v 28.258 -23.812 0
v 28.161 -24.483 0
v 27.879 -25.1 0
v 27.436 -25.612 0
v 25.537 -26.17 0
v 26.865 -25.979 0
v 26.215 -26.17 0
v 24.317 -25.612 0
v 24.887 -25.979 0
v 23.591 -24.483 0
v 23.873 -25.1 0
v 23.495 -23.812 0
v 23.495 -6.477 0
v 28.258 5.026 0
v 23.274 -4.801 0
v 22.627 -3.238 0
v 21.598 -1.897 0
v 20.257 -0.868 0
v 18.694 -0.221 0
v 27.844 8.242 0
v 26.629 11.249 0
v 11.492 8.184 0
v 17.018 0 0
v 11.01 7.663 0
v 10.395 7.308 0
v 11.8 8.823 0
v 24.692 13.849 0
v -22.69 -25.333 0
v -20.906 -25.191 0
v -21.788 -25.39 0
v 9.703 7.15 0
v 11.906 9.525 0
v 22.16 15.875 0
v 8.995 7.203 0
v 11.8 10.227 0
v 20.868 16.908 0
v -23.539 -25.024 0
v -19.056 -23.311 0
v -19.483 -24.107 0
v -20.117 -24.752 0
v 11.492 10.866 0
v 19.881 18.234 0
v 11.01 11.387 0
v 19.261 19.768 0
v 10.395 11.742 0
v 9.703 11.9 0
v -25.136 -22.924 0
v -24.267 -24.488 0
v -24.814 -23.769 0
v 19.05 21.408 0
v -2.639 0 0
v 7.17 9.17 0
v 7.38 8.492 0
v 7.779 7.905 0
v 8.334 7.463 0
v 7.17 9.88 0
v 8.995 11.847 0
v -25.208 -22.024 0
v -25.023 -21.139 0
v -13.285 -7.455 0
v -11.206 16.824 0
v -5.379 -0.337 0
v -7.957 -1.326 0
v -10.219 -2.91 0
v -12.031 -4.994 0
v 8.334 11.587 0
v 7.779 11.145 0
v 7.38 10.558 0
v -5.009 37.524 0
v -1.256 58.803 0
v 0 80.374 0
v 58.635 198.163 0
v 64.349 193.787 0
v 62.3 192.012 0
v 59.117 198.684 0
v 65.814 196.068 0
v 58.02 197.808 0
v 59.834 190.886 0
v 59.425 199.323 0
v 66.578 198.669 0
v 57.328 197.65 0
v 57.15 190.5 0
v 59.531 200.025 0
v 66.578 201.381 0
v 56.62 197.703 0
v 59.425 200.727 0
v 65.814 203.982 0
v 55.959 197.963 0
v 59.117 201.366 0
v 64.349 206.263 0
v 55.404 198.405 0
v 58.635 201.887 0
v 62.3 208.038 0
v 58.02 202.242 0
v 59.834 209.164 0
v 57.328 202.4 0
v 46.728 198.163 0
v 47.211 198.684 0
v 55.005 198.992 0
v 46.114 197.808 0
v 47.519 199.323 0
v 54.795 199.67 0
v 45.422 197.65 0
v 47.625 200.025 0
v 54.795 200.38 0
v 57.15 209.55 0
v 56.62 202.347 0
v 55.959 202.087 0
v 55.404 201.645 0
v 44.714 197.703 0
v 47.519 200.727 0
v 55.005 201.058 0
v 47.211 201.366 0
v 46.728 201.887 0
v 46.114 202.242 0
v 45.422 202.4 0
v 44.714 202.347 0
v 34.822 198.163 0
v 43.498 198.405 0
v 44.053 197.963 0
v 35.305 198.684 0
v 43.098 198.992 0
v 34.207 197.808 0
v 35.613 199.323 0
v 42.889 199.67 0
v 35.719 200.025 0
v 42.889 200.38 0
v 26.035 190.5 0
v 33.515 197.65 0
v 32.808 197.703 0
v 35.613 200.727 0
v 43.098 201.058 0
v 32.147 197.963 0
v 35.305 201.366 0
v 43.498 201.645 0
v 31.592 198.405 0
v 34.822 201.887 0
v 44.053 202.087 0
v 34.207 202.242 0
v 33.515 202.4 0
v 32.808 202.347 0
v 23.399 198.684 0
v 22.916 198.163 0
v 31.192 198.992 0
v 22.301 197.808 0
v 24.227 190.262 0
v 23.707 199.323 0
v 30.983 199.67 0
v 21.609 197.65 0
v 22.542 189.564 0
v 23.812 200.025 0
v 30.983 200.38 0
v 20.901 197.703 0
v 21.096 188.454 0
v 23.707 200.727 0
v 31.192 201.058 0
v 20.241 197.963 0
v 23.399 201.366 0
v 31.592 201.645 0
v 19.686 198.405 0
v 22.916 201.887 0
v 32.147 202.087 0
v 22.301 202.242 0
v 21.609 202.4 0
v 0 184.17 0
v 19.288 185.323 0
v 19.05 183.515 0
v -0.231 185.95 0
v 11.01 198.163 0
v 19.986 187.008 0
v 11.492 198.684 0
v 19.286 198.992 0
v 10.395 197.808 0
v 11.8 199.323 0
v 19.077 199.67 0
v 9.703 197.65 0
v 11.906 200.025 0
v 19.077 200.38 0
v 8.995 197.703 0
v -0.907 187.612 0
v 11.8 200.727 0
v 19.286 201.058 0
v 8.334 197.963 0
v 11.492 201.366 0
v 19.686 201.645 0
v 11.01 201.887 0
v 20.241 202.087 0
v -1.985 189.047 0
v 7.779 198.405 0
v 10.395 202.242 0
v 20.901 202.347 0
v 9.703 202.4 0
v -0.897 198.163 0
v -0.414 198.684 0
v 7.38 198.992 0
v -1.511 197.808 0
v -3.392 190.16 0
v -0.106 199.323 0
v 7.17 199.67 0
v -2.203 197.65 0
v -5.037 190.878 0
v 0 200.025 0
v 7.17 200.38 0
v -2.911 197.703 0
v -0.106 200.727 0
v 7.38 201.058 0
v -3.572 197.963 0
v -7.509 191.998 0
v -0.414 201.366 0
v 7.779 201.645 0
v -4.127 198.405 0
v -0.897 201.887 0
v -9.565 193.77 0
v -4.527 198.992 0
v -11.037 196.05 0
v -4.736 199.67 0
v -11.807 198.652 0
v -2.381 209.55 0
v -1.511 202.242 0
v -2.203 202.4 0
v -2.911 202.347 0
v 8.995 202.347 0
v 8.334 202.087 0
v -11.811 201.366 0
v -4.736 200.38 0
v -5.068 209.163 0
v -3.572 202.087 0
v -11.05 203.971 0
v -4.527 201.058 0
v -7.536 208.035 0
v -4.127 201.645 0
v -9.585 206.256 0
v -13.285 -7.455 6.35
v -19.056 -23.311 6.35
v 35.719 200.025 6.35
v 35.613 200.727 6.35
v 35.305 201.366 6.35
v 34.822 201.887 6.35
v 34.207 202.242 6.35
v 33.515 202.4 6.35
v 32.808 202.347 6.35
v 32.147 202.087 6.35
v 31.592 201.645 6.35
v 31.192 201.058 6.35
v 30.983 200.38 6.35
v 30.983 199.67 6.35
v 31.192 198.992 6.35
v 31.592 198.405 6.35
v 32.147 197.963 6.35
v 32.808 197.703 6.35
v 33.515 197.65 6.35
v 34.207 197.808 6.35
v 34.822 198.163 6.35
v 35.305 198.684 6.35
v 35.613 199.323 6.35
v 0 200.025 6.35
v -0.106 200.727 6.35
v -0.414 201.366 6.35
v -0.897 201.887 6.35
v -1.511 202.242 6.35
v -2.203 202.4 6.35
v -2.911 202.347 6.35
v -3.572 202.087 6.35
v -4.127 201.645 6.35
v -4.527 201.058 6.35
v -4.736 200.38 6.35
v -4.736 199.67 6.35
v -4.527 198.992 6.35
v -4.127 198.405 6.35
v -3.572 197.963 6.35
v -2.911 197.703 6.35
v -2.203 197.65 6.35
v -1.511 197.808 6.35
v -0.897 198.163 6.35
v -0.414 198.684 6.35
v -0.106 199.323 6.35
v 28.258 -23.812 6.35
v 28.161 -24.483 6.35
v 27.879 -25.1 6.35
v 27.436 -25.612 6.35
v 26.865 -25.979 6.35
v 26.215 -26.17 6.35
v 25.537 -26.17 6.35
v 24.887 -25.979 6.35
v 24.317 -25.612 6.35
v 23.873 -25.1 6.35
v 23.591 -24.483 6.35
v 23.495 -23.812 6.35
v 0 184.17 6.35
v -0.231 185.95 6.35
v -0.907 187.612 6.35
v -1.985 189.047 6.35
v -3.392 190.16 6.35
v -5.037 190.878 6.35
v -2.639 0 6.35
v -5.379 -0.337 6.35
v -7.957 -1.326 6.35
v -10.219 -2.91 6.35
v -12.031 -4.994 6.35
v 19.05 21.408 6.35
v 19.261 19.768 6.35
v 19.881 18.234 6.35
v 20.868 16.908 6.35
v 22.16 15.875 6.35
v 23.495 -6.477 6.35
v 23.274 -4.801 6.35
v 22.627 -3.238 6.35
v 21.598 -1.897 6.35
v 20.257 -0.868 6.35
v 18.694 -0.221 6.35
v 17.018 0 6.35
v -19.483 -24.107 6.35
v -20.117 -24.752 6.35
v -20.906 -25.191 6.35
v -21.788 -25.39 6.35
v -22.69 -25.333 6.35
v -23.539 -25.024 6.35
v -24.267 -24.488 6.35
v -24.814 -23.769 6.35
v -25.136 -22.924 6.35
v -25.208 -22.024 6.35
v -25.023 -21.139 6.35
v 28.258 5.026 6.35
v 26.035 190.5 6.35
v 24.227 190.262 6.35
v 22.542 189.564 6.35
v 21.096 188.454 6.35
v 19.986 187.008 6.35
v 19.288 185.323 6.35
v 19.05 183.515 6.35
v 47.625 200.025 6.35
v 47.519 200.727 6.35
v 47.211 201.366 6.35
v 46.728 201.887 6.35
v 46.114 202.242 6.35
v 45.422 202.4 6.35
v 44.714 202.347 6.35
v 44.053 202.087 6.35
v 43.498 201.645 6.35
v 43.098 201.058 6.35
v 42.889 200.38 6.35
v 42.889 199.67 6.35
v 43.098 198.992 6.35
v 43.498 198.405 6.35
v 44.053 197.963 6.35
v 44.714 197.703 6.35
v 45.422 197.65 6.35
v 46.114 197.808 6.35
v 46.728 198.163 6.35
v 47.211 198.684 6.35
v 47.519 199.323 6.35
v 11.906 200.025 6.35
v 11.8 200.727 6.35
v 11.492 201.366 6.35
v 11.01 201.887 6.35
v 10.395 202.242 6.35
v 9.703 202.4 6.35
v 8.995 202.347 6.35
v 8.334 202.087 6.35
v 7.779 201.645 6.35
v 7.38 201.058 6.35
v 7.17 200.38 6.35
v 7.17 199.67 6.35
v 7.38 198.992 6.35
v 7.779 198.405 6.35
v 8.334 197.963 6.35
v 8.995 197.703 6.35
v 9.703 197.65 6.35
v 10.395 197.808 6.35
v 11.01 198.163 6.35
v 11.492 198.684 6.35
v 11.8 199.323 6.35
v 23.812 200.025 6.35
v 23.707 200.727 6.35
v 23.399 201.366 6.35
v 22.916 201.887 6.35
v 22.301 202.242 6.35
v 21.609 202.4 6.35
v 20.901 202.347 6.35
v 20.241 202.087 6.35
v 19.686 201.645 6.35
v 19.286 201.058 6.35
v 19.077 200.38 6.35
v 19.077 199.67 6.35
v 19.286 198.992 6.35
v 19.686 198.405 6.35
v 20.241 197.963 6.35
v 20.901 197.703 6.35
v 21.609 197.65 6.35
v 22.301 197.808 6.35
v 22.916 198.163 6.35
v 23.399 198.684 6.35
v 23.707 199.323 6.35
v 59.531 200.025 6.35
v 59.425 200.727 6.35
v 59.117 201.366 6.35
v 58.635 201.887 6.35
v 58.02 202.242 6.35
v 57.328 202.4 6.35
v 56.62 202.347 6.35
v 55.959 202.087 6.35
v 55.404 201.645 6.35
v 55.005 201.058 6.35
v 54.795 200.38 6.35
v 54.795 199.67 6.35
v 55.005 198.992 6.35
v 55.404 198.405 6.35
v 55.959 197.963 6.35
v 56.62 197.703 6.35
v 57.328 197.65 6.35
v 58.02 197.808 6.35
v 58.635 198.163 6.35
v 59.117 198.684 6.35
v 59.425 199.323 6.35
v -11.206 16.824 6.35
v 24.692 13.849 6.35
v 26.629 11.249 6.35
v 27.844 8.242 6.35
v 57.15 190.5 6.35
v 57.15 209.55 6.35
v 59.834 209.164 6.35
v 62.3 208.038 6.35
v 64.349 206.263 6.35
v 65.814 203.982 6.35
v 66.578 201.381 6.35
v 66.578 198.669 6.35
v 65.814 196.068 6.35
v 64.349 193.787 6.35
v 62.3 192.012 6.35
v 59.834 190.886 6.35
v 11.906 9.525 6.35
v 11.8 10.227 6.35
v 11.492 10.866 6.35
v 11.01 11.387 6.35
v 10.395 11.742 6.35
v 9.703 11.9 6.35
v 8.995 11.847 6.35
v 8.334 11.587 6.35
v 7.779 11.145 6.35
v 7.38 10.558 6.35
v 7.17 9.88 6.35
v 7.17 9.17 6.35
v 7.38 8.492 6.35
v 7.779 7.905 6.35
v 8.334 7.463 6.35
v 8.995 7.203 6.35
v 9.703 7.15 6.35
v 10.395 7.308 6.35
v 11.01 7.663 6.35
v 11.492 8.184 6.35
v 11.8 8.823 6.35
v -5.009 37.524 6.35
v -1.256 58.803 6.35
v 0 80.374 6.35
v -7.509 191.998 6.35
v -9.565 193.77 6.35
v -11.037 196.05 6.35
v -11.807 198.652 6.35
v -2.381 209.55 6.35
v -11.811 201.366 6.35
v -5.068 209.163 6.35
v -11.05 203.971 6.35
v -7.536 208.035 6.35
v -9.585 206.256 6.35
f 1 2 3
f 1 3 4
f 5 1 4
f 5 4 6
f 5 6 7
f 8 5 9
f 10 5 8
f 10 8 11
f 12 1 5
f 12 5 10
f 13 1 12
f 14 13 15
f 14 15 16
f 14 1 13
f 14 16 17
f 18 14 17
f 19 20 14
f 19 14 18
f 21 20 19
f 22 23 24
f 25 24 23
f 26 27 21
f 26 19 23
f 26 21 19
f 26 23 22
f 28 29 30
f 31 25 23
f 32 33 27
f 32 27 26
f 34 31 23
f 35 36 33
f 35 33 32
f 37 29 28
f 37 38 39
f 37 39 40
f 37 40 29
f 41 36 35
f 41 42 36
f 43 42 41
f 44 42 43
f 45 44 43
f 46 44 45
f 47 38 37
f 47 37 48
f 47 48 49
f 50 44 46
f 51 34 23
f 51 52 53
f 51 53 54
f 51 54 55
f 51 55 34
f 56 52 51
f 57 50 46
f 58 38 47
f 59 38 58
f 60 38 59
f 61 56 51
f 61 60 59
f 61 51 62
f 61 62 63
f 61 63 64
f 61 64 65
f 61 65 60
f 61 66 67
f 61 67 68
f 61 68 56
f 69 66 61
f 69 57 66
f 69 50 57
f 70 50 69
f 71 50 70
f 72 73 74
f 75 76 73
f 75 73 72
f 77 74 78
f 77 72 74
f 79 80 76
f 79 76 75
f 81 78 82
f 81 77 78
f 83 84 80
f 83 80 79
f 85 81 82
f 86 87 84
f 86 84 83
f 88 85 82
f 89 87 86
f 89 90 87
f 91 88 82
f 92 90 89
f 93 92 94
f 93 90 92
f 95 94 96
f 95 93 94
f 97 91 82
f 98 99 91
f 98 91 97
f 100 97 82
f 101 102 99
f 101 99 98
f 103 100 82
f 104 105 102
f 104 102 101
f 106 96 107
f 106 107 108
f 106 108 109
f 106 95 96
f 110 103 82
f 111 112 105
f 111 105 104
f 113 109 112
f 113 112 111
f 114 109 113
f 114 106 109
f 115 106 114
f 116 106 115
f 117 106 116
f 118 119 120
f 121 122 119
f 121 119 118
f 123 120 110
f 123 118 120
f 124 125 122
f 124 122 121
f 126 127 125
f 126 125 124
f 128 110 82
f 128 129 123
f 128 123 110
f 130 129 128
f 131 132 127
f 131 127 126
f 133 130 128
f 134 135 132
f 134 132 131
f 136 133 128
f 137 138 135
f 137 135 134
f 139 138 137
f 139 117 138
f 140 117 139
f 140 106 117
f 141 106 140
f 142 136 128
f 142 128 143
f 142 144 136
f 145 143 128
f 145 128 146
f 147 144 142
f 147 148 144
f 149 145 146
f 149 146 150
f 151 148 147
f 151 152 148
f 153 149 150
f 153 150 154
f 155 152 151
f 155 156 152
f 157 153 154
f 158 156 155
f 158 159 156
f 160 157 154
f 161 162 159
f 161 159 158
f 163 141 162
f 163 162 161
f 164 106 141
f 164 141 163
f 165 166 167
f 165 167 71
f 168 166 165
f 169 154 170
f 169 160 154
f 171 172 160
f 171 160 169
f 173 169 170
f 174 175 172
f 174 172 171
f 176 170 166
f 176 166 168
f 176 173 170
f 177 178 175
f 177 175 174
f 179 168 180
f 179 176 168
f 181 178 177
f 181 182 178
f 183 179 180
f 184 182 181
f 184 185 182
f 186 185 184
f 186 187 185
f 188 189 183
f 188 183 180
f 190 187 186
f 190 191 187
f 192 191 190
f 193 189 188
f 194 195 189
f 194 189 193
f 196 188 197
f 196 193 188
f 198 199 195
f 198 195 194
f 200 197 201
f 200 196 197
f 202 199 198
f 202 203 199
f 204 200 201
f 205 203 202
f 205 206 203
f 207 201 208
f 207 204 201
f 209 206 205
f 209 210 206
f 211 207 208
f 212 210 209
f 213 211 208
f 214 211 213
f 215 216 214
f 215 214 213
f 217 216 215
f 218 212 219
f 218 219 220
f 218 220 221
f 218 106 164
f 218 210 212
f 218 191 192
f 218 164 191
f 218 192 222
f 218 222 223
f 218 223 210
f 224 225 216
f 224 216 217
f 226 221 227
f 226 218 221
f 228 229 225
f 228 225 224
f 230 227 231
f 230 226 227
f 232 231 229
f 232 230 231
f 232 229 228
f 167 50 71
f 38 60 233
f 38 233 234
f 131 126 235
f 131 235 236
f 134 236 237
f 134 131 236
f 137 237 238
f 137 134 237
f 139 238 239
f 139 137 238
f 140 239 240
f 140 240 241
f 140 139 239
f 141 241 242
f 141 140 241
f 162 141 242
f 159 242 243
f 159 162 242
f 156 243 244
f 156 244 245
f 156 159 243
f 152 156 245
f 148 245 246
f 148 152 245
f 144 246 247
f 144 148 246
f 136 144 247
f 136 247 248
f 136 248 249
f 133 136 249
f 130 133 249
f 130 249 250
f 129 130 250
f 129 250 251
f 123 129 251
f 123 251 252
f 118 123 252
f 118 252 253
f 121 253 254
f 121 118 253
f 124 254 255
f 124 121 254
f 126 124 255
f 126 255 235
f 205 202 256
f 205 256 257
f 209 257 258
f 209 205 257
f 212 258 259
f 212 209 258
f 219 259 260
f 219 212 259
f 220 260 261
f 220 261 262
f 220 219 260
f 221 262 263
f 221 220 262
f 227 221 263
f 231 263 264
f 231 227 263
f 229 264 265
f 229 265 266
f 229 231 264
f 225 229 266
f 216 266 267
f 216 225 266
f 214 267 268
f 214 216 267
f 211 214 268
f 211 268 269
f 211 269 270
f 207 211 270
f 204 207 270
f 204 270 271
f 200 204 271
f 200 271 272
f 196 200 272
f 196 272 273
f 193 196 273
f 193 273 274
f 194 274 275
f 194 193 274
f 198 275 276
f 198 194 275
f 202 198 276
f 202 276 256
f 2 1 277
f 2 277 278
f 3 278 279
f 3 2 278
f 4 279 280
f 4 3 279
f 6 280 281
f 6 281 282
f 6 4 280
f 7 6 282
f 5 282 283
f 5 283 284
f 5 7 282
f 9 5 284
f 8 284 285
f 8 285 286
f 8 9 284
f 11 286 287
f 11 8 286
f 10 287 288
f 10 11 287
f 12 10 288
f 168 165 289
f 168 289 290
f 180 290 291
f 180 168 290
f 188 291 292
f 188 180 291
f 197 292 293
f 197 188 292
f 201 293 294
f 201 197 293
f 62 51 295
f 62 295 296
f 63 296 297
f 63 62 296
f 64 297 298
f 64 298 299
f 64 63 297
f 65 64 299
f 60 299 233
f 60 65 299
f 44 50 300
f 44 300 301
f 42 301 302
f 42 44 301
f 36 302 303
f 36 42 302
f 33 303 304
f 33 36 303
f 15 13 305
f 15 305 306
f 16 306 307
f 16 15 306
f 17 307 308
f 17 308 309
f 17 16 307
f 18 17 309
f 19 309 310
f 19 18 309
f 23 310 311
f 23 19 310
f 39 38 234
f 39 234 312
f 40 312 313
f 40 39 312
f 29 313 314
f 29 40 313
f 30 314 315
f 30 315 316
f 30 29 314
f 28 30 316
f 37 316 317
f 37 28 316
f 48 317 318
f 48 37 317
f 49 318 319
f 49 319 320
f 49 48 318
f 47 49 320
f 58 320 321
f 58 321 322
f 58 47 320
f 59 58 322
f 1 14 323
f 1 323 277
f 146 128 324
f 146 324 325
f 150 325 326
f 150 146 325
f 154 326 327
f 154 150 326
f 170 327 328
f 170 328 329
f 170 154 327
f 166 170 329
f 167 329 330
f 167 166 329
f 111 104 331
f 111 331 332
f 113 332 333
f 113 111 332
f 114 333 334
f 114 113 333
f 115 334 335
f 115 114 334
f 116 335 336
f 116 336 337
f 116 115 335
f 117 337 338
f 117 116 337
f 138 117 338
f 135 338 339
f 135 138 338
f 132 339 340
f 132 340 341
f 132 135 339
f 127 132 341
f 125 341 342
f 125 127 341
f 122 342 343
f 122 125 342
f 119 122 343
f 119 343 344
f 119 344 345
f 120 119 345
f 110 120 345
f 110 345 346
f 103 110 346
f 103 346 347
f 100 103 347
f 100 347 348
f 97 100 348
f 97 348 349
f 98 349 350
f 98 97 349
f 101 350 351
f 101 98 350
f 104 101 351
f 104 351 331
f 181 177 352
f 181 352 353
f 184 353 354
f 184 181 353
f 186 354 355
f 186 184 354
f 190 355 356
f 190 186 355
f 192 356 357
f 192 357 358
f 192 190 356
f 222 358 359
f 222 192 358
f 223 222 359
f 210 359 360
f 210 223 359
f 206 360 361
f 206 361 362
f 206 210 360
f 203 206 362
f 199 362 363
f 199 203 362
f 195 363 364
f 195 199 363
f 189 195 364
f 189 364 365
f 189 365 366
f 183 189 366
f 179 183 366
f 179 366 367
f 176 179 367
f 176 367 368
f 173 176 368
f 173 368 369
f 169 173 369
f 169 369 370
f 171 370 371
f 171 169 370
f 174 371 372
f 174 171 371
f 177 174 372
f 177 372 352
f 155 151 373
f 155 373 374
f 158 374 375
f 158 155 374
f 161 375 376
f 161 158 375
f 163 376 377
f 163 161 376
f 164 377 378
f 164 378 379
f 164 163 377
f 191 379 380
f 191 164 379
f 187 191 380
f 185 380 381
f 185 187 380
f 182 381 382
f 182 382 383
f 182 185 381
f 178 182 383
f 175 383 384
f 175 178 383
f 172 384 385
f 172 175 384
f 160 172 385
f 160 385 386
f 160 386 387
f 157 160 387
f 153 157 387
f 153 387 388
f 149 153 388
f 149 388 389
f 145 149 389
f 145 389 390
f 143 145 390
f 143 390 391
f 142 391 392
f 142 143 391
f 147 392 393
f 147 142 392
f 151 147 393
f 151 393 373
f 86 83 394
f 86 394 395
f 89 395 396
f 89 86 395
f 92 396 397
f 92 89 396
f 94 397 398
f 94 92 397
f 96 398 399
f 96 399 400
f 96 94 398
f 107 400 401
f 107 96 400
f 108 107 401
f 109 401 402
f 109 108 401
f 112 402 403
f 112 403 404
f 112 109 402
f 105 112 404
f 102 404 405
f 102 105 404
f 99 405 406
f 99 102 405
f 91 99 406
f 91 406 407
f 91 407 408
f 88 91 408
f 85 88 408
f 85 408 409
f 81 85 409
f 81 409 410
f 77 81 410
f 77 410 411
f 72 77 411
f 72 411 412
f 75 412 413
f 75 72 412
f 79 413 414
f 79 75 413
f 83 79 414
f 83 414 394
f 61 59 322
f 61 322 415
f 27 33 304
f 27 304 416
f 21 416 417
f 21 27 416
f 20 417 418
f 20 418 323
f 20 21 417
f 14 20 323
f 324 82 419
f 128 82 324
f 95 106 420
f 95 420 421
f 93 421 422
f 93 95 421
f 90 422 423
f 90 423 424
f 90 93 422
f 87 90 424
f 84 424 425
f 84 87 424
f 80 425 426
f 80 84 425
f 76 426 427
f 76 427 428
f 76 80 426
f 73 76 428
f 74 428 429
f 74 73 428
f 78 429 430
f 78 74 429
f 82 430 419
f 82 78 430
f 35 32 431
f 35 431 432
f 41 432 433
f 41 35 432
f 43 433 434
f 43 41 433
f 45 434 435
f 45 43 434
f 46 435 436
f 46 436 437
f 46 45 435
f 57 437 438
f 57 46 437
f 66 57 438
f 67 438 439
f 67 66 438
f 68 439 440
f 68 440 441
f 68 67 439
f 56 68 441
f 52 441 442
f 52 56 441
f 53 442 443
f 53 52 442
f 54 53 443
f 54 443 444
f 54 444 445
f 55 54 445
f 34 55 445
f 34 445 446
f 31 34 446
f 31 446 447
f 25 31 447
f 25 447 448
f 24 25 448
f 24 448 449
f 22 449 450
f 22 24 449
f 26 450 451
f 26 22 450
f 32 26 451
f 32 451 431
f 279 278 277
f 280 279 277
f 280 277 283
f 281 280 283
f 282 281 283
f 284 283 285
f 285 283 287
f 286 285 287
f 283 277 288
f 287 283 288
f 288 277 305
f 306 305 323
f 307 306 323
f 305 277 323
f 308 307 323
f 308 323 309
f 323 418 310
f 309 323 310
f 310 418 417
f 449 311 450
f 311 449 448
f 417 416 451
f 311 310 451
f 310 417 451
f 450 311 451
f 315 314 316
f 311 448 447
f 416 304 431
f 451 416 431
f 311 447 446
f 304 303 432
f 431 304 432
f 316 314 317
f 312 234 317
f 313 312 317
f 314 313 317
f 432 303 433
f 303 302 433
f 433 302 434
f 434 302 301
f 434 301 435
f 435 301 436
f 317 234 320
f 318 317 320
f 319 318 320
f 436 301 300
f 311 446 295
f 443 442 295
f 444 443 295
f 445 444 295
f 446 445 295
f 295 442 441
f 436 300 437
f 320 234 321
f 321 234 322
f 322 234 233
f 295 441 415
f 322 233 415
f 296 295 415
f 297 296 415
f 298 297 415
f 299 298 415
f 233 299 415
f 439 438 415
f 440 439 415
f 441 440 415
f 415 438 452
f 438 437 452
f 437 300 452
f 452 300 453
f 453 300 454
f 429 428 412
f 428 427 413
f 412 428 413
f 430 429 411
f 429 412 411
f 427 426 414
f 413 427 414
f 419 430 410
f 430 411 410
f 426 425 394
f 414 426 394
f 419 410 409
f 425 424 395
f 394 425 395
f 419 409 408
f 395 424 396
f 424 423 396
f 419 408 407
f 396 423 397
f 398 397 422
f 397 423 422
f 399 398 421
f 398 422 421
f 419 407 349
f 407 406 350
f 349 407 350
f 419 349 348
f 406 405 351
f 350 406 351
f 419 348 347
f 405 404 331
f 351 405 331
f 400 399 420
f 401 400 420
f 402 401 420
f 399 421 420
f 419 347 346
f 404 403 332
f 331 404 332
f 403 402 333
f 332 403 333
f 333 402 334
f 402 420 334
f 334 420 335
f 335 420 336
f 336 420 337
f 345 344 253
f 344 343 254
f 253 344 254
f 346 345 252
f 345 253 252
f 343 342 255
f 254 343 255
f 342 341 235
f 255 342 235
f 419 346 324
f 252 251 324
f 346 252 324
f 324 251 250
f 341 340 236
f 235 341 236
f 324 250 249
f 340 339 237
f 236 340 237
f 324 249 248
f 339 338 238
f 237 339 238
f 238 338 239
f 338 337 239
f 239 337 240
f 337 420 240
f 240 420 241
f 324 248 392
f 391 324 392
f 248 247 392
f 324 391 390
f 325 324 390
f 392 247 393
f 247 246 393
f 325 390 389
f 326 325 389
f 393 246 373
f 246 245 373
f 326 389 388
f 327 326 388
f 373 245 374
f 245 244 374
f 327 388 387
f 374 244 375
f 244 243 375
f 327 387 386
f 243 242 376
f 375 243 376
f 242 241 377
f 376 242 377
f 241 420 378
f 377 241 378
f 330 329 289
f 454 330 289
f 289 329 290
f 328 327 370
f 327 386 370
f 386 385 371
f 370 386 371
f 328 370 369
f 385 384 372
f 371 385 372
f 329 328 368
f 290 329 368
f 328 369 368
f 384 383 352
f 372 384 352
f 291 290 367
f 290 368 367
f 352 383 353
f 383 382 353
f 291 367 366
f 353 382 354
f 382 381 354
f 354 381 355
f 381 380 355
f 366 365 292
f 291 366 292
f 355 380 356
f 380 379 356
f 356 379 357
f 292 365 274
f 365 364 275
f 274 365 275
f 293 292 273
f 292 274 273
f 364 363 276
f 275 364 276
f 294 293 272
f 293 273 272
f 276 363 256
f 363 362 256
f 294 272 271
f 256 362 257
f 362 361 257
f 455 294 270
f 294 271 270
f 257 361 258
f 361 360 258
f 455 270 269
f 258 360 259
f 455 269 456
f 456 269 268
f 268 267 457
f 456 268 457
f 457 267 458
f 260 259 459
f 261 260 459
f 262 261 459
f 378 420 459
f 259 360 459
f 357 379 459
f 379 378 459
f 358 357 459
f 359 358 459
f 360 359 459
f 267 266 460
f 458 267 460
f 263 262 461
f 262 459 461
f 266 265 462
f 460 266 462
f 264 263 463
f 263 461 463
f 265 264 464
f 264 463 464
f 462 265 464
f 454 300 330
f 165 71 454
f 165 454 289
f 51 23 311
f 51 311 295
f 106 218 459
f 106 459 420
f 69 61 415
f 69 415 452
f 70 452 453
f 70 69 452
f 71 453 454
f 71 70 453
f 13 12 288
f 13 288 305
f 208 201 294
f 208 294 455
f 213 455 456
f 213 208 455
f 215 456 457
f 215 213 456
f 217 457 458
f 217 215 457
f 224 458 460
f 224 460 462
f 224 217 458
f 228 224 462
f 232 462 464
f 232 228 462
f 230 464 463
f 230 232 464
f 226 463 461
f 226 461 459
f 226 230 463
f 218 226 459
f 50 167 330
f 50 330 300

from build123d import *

# Parameters (mm, degrees)
SKETCH1_R           = 2.38125
BOSS_EXTRUDE1_DEPTH = 6.35


with BuildPart() as part:
    # Sketch1 → Boss-Extrude1 (new body)
    with BuildSketch(Plane.XY):
        with BuildLine():
            Line((0, 80.374326863), (0, 184.169856168))
            ThreePointArc((0, 184.169856168), (-1.399519198, 188.364212997), (-5.037259615, 190.877801635))
            ThreePointArc((-5.037259615, 190.877801635), (-11.811326602, 201.366372539), (-2.38125, 209.55))
            Line((-2.38125, 209.55), (57.15, 209.55))
            ThreePointArc((57.15, 209.55), (66.675, 200.025), (57.15, 190.5))
            Line((57.15, 190.5), (26.035, 190.5))
            ThreePointArc((26.035, 190.5), (21.095859133, 188.454140867), (19.05, 183.515))
            Line((19.05, 183.515), (19.05, 21.407957037))
            ThreePointArc((19.05, 21.407957037), (19.880728328, 18.234450269), (22.159817881, 15.875))
            ThreePointArc((22.159817881, 15.875), (26.628620925, 11.248626923), (28.2575, 5.026064633))
            Line((28.2575, 5.026064633), (28.2575, -23.8125))
            ThreePointArc((28.2575, -23.8125), (25.87625, -26.19375), (23.495, -23.8125))
            Line((23.495, -23.8125), (23.495, -6.477))
            ThreePointArc((23.495, -6.477), (21.597930622, -1.897069378), (17.018, 0))
            Line((17.018, 0), (-2.638551939, 0))
            ThreePointArc((-2.638551939, 0), (-9.136828191, -2.048898632), (-13.284704491, -7.45451627))
            Line((-13.284704491, -7.45451627), (-19.055961271, -23.310913955))
            ThreePointArc((-19.055961271, -23.310913955), (-23.125399297, -25.208524071), (-25.023009413, -21.139086045))
            Line((-25.023009413, -21.139086045), (-11.205694737, 16.823674026))
            ThreePointArc((-11.205694737, 16.823674026), (-2.822866527, 48.108814817), (0, 80.374326863))
        make_face()
        with Locations((9.525, 9.525)):
            Circle(SKETCH1_R, mode=Mode.SUBTRACT)
        with Locations((9.525, 200.025)):
            Circle(SKETCH1_R, mode=Mode.SUBTRACT)
        with Locations((21.43125, 200.025)):
            Circle(SKETCH1_R, mode=Mode.SUBTRACT)
        with Locations((-2.38125, 200.025)):
            Circle(SKETCH1_R, mode=Mode.SUBTRACT)
        with Locations((33.3375, 200.025)):
            Circle(SKETCH1_R, mode=Mode.SUBTRACT)
        with Locations((57.15, 200.025)):
            Circle(SKETCH1_R, mode=Mode.SUBTRACT)
        with Locations((45.24375, 200.025)):
            Circle(SKETCH1_R, mode=Mode.SUBTRACT)
    extrude(amount=BOSS_EXTRUDE1_DEPTH)


solid = part.part
